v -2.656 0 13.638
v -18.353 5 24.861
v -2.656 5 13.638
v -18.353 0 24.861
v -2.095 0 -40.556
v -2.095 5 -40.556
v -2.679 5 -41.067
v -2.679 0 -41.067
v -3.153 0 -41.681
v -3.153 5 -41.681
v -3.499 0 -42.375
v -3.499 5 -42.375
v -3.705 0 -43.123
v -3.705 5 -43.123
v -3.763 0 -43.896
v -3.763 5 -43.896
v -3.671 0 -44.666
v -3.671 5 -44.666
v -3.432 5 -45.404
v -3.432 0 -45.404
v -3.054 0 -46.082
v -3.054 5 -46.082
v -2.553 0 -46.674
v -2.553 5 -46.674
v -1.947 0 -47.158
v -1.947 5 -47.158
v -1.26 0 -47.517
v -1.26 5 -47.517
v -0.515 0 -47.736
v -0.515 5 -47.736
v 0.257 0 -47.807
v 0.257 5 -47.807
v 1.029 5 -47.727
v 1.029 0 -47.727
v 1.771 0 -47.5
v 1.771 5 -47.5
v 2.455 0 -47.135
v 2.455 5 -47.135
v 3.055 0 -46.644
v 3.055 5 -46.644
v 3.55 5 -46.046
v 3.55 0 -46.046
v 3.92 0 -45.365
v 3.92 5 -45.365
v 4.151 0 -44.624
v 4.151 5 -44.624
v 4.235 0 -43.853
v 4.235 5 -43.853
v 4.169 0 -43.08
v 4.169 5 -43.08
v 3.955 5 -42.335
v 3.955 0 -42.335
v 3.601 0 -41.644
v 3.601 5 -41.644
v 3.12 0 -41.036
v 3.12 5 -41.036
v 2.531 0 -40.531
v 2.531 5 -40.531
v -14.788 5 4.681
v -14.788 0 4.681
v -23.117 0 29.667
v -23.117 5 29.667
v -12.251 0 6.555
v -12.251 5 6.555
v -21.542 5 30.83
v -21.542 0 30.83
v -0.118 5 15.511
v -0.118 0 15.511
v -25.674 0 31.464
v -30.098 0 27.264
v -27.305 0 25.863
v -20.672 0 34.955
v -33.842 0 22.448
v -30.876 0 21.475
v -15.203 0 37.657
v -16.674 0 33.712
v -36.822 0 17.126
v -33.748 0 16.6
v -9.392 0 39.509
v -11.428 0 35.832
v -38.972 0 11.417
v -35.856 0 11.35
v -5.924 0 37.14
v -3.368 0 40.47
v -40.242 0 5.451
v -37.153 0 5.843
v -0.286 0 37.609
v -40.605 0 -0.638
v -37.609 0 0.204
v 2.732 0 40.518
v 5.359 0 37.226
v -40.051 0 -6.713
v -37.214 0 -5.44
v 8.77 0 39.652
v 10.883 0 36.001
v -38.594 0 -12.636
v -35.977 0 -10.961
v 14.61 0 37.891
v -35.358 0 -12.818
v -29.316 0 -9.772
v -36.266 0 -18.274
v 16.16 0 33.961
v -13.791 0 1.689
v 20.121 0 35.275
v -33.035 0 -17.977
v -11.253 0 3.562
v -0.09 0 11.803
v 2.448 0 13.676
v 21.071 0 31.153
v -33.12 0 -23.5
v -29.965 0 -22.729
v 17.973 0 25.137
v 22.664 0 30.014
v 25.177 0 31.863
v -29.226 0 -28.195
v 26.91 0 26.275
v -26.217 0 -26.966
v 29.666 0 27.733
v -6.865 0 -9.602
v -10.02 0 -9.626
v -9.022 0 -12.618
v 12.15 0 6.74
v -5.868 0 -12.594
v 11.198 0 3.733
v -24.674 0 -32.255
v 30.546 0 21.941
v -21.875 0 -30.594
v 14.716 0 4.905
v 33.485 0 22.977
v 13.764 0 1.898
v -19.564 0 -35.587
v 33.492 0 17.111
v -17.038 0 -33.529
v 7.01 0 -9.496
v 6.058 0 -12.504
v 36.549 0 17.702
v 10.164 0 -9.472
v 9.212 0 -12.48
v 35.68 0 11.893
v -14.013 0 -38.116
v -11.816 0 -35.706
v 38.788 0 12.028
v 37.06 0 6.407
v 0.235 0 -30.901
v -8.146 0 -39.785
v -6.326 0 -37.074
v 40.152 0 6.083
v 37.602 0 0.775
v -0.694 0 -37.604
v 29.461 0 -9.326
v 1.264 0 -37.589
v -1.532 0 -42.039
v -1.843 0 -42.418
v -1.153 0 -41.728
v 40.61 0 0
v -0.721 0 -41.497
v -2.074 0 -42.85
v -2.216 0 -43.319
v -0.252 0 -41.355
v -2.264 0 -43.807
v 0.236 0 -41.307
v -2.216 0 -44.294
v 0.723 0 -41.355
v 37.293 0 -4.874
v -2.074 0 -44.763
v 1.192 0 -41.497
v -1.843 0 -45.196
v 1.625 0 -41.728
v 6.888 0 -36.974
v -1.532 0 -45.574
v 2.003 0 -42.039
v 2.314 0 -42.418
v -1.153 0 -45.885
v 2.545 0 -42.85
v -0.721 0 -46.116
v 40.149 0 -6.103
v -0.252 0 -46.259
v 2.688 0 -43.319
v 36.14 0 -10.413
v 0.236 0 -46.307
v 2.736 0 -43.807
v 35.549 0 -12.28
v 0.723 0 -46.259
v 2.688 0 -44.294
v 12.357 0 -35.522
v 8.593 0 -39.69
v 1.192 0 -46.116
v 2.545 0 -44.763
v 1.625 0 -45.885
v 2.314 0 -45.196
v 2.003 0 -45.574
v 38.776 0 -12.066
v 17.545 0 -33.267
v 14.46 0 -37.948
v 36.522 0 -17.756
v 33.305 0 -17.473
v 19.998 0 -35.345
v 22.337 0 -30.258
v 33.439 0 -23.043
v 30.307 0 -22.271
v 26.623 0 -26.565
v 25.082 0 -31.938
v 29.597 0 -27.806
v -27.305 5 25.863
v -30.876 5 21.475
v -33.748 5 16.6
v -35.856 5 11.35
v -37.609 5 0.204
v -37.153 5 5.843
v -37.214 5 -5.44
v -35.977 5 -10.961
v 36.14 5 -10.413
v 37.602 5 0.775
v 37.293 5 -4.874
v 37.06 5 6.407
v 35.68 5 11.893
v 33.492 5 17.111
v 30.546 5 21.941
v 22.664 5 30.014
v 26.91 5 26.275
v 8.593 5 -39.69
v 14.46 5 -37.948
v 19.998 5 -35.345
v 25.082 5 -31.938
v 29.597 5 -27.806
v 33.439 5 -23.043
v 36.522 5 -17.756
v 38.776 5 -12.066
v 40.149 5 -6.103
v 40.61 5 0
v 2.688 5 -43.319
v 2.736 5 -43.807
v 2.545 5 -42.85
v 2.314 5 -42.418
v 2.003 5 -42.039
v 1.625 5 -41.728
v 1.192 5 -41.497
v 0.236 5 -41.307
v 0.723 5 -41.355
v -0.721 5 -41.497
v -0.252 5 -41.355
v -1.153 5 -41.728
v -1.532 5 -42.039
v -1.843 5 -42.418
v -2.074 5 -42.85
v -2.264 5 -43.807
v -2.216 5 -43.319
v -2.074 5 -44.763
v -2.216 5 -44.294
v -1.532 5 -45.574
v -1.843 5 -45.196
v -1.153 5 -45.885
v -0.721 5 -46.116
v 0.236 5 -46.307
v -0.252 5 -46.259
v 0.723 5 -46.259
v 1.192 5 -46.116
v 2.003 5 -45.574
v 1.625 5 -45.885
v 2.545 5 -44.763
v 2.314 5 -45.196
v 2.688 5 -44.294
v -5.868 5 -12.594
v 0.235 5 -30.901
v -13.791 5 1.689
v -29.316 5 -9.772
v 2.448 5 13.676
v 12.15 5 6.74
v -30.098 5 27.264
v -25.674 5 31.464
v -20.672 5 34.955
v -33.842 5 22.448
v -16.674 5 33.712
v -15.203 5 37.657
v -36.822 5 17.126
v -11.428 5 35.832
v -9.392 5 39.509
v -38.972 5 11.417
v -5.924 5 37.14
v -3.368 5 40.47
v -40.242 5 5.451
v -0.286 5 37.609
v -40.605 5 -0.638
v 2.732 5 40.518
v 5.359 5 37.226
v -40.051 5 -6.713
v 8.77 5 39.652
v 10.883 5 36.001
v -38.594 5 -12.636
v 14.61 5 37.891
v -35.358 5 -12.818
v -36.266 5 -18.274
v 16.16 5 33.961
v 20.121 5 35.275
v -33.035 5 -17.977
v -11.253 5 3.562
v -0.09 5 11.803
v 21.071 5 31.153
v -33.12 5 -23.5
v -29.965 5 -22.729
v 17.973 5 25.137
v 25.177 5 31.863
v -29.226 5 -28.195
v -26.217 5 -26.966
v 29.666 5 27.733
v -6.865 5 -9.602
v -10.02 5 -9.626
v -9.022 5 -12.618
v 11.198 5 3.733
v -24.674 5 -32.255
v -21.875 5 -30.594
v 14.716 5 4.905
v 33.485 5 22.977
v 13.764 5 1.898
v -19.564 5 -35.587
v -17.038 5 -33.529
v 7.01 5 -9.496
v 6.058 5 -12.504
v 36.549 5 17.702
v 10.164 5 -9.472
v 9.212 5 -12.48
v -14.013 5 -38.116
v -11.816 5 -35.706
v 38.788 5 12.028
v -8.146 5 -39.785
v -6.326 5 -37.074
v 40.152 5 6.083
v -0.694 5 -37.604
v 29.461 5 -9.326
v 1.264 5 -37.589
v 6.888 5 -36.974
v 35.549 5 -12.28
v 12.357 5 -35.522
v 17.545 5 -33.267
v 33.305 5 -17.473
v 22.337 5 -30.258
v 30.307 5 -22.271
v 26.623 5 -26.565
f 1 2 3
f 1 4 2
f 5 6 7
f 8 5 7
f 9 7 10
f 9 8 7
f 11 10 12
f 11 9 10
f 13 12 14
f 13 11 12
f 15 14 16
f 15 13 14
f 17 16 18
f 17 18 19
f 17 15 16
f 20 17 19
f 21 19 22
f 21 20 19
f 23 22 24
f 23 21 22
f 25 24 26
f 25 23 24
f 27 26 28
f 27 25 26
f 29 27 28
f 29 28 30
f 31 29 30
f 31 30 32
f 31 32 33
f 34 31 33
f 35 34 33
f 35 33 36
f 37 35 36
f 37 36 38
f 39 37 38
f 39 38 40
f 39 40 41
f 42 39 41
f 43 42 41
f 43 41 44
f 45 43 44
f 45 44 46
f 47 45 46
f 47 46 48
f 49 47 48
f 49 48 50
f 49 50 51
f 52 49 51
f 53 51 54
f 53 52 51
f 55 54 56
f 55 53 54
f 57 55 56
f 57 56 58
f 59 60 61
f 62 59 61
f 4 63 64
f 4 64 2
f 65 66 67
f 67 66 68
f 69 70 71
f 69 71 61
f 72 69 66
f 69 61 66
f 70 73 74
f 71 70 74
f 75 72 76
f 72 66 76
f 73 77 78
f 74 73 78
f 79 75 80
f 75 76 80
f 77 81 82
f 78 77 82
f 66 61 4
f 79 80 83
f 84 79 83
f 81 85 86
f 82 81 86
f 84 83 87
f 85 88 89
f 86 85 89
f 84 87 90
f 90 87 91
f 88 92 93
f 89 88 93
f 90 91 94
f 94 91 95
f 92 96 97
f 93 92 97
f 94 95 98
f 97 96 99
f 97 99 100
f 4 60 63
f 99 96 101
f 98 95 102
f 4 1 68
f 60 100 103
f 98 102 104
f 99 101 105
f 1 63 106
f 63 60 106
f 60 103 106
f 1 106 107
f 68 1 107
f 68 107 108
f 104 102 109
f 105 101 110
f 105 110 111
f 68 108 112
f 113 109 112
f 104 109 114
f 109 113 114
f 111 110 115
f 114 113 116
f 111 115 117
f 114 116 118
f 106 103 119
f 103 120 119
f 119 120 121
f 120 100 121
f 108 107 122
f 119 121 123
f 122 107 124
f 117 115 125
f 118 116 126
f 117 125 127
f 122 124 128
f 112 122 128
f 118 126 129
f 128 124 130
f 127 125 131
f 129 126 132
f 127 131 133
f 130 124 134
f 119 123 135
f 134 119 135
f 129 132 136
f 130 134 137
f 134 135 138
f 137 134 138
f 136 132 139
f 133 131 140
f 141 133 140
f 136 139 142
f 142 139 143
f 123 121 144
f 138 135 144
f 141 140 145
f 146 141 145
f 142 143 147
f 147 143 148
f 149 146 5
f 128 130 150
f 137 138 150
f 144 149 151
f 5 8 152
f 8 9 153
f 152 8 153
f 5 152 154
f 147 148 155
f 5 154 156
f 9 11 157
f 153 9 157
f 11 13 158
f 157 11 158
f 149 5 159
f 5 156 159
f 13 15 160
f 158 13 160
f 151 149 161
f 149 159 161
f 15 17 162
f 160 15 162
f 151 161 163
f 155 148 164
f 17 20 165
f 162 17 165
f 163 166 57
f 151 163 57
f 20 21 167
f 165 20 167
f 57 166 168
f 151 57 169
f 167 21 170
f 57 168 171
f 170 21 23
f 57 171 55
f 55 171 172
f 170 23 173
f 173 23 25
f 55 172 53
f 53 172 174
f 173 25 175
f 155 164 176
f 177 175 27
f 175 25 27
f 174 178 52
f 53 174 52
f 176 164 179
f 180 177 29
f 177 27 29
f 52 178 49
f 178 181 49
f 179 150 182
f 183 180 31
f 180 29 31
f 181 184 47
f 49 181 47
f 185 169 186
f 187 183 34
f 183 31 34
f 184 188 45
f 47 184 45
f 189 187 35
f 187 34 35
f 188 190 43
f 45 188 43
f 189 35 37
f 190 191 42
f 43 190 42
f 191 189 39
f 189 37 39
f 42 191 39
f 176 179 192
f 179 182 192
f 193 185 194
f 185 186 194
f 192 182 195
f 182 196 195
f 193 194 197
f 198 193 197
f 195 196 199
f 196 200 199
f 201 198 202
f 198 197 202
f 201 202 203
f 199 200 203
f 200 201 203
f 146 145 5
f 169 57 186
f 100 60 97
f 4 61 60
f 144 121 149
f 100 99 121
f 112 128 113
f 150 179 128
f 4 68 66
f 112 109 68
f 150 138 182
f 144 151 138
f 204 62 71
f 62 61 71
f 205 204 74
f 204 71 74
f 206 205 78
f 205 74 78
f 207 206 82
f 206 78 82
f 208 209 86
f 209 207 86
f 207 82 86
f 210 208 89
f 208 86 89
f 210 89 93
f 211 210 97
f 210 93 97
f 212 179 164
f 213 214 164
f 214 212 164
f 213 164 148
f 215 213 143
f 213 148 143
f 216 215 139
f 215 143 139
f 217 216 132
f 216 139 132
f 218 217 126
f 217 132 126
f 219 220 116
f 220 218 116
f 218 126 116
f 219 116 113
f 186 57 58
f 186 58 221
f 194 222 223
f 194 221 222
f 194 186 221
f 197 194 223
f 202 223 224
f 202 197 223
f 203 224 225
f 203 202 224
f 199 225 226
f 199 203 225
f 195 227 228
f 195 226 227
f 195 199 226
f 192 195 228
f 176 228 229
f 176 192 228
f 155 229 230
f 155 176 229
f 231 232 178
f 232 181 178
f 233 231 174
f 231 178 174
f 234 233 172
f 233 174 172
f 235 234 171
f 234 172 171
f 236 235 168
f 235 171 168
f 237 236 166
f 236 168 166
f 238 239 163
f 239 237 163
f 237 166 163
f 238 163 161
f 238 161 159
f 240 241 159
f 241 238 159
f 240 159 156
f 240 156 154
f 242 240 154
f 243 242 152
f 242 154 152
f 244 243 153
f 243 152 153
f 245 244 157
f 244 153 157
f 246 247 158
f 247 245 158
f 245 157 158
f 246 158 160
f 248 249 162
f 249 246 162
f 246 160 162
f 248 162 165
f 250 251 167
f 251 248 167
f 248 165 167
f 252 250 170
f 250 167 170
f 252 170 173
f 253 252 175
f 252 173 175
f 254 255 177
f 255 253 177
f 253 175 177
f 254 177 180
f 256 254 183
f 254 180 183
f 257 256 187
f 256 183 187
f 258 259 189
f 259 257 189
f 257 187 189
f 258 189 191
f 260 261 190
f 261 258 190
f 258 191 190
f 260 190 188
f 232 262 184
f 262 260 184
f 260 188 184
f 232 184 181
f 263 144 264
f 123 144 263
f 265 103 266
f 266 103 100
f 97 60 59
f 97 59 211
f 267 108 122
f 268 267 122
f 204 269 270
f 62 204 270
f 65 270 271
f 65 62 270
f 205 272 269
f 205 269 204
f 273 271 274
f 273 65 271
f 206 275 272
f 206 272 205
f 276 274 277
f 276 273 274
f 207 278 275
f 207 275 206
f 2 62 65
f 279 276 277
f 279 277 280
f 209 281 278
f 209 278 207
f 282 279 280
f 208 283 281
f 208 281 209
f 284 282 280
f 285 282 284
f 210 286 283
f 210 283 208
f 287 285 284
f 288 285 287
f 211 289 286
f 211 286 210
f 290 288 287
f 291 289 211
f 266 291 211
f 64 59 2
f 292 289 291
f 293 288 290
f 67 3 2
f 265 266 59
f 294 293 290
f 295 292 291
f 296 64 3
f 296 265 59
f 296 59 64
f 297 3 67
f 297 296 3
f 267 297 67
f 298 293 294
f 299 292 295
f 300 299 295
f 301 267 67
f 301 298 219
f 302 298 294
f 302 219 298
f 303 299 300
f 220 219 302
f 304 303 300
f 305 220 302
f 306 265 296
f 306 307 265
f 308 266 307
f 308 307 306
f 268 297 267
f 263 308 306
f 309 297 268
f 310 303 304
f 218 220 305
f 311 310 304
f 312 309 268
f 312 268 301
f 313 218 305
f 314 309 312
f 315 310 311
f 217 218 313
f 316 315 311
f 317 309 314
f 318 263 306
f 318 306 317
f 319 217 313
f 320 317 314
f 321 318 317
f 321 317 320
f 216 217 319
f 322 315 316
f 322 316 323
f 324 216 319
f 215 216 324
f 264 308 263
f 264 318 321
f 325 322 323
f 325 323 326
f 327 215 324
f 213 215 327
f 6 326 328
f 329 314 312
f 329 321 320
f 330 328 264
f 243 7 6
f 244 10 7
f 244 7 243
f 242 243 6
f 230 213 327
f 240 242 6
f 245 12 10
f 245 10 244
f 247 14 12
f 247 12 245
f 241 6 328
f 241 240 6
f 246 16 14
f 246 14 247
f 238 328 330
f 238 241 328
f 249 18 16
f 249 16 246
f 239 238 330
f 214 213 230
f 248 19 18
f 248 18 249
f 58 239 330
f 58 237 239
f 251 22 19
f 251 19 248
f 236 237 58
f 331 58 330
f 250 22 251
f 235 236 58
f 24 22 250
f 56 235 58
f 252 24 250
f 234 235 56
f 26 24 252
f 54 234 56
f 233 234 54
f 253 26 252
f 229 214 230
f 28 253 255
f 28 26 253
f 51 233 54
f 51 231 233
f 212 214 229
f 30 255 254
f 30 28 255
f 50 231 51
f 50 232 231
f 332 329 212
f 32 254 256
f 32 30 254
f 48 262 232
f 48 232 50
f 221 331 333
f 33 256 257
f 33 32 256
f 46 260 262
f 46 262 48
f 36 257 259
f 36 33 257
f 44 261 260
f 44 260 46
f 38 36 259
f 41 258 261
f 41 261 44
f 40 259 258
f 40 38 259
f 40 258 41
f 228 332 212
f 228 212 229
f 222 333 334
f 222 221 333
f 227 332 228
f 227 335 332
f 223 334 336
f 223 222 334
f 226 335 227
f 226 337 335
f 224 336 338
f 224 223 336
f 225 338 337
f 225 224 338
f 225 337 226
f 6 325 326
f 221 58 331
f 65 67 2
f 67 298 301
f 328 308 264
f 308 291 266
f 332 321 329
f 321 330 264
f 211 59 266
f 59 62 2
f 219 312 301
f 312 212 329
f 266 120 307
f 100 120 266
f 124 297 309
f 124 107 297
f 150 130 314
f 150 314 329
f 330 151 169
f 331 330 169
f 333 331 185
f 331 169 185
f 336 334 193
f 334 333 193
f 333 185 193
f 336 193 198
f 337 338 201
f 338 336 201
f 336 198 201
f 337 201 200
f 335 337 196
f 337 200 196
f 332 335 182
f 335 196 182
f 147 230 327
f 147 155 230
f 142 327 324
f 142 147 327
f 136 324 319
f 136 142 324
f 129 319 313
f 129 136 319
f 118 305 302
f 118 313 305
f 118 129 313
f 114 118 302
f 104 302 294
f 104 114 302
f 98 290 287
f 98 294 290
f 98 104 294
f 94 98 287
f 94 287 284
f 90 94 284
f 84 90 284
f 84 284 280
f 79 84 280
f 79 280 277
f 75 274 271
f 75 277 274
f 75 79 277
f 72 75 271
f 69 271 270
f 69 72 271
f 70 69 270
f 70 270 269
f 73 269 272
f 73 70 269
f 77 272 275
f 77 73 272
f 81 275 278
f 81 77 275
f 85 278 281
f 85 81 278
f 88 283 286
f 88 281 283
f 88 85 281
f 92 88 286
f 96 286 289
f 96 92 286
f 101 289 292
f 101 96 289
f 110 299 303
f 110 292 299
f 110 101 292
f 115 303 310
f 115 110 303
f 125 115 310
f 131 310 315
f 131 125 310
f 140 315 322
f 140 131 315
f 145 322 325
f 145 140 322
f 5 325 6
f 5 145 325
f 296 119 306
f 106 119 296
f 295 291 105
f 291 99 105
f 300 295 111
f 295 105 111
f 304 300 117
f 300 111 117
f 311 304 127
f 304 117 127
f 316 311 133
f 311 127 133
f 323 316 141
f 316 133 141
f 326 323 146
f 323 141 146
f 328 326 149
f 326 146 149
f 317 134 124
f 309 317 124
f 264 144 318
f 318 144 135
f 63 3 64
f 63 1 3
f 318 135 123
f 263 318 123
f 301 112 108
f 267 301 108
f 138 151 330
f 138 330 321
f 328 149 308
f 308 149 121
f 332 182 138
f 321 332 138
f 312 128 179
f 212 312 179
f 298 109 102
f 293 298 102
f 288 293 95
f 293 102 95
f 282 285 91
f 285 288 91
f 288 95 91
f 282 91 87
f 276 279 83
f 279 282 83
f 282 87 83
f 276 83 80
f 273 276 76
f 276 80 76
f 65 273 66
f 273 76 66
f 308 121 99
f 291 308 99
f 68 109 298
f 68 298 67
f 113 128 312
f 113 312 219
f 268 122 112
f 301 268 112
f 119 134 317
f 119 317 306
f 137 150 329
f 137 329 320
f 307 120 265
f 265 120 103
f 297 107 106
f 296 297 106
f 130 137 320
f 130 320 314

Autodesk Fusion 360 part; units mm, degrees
sketch "草图1" plane through (0, 0, 0) normal (0, 1, 0) x (1, 0, 0)
  circle A0 centre (0, 0) radius 40.6099
  arc A1 (22.6638, -30.0143) -> (36.1396, 10.4131) centre (0, 0) ccw
  arc A2 (35.5488, 12.2796) -> (1.2643, 37.5886) centre (0, 0) ccw
  arc A3 (-21.5418, -30.8295) -> (21.0712, -31.153) centre (0, 0) ccw
  arc A4 (-0.6935, 37.6035) -> (-35.3582, 12.8179) centre (0, 0) ccw
  arc A5 (-35.9774, 10.9606) -> (-23.1169, -29.6667) centre (0, 0) ccw
  line L0 (-9.022, 12.618) -> (-35.3582, 12.8179)
  line L1 (-10.0195, 9.6255) -> (-29.3159, 9.772)
  line L2 (0.2346, 30.9008) -> (-5.8677, 12.5941)
  line L3 (-0.6935, 37.6035) -> (-9.022, 12.618)
  line L4 (0.2346, 30.9008) -> (6.0582, 12.5035)
  line L5 (35.5488, 12.2796) -> (9.2125, 12.4796)
  line L6 (6.0582, 12.5035) -> (-5.8677, 12.5941)
  line L7 (1.2643, 37.5886) -> (9.2125, 12.4796)
  line L8 (29.4609, 9.3258) -> (10.1644, 9.4723)
  line L9 (7.0102, 9.4962) -> (-6.8652, 9.6015)
  line L10 (13.7636, -1.8979) -> (29.4609, 9.3258)
  line L11 (14.7156, -4.9052) -> (36.1396, 10.4131)
  line L12 (7.0102, 9.4962) -> (11.1977, -3.7326)
  line L13 (12.1496, -6.7399) -> (17.9733, -25.1372)
  line L14 (10.1644, 9.4723) -> (13.7636, -1.8979)
  line L15 (14.7156, -4.9052) -> (22.6638, -30.0143)
  line L16 (17.9733, -25.1372) -> (2.4482, -13.6765)
  line L17 (21.0712, -31.153) -> (-0.1178, -15.5112)
  line L18 (-18.3528, -24.8614) -> (-2.6556, -13.6377)
  line L19 (-0.0896, -11.8031) -> (11.1977, -3.7326)
  line L20 (-21.5418, -30.8295) -> (-0.1178, -15.5112)
  line L21 (2.4482, -13.6765) -> (12.1496, -6.7399)
  line L22 (-6.8652, 9.6015) -> (-11.2531, -3.5621)
  line L23 (-12.2506, -6.5546) -> (-18.3528, -24.8614)
  line L24 (-2.6556, -13.6377) -> (-12.2506, -6.5546)
  line L25 (-14.7884, -4.6812) -> (-35.9774, 10.9606)
  line L26 (-0.0896, -11.8031) -> (-11.2531, -3.5621)
  line L27 (-13.7909, -1.6887) -> (-29.3159, 9.772)
  line L28 (-10.0195, 9.6255) -> (-13.7909, -1.6887)
  line L29 (-14.7884, -4.6812) -> (-23.1169, -29.6667)
extrude "拉伸1" add sketch "草图1" along normal blind 5 makes body 1
sketch "草图2" plane through (0, 0, 0) normal (0, 1, 0) x (1, 0, 0)
  circle A0 centre (58.5356, 21.3067) radius 4
  circle A1 centre (58.5356, 21.3067) radius 2.5
  dimension "d6" = 8
  dimension "d7" = 5
extrude "拉伸2" add sketch "草图2" along normal blind 5 separate body makes body 2
move_body "移动1" bodies 2 to x (1, 0, 0) y (0, 1, 0) z (0, 0, 1) at (-58.3, 0, -22.5)
combine "合并1" operation add target body 1 tool bodies 2
